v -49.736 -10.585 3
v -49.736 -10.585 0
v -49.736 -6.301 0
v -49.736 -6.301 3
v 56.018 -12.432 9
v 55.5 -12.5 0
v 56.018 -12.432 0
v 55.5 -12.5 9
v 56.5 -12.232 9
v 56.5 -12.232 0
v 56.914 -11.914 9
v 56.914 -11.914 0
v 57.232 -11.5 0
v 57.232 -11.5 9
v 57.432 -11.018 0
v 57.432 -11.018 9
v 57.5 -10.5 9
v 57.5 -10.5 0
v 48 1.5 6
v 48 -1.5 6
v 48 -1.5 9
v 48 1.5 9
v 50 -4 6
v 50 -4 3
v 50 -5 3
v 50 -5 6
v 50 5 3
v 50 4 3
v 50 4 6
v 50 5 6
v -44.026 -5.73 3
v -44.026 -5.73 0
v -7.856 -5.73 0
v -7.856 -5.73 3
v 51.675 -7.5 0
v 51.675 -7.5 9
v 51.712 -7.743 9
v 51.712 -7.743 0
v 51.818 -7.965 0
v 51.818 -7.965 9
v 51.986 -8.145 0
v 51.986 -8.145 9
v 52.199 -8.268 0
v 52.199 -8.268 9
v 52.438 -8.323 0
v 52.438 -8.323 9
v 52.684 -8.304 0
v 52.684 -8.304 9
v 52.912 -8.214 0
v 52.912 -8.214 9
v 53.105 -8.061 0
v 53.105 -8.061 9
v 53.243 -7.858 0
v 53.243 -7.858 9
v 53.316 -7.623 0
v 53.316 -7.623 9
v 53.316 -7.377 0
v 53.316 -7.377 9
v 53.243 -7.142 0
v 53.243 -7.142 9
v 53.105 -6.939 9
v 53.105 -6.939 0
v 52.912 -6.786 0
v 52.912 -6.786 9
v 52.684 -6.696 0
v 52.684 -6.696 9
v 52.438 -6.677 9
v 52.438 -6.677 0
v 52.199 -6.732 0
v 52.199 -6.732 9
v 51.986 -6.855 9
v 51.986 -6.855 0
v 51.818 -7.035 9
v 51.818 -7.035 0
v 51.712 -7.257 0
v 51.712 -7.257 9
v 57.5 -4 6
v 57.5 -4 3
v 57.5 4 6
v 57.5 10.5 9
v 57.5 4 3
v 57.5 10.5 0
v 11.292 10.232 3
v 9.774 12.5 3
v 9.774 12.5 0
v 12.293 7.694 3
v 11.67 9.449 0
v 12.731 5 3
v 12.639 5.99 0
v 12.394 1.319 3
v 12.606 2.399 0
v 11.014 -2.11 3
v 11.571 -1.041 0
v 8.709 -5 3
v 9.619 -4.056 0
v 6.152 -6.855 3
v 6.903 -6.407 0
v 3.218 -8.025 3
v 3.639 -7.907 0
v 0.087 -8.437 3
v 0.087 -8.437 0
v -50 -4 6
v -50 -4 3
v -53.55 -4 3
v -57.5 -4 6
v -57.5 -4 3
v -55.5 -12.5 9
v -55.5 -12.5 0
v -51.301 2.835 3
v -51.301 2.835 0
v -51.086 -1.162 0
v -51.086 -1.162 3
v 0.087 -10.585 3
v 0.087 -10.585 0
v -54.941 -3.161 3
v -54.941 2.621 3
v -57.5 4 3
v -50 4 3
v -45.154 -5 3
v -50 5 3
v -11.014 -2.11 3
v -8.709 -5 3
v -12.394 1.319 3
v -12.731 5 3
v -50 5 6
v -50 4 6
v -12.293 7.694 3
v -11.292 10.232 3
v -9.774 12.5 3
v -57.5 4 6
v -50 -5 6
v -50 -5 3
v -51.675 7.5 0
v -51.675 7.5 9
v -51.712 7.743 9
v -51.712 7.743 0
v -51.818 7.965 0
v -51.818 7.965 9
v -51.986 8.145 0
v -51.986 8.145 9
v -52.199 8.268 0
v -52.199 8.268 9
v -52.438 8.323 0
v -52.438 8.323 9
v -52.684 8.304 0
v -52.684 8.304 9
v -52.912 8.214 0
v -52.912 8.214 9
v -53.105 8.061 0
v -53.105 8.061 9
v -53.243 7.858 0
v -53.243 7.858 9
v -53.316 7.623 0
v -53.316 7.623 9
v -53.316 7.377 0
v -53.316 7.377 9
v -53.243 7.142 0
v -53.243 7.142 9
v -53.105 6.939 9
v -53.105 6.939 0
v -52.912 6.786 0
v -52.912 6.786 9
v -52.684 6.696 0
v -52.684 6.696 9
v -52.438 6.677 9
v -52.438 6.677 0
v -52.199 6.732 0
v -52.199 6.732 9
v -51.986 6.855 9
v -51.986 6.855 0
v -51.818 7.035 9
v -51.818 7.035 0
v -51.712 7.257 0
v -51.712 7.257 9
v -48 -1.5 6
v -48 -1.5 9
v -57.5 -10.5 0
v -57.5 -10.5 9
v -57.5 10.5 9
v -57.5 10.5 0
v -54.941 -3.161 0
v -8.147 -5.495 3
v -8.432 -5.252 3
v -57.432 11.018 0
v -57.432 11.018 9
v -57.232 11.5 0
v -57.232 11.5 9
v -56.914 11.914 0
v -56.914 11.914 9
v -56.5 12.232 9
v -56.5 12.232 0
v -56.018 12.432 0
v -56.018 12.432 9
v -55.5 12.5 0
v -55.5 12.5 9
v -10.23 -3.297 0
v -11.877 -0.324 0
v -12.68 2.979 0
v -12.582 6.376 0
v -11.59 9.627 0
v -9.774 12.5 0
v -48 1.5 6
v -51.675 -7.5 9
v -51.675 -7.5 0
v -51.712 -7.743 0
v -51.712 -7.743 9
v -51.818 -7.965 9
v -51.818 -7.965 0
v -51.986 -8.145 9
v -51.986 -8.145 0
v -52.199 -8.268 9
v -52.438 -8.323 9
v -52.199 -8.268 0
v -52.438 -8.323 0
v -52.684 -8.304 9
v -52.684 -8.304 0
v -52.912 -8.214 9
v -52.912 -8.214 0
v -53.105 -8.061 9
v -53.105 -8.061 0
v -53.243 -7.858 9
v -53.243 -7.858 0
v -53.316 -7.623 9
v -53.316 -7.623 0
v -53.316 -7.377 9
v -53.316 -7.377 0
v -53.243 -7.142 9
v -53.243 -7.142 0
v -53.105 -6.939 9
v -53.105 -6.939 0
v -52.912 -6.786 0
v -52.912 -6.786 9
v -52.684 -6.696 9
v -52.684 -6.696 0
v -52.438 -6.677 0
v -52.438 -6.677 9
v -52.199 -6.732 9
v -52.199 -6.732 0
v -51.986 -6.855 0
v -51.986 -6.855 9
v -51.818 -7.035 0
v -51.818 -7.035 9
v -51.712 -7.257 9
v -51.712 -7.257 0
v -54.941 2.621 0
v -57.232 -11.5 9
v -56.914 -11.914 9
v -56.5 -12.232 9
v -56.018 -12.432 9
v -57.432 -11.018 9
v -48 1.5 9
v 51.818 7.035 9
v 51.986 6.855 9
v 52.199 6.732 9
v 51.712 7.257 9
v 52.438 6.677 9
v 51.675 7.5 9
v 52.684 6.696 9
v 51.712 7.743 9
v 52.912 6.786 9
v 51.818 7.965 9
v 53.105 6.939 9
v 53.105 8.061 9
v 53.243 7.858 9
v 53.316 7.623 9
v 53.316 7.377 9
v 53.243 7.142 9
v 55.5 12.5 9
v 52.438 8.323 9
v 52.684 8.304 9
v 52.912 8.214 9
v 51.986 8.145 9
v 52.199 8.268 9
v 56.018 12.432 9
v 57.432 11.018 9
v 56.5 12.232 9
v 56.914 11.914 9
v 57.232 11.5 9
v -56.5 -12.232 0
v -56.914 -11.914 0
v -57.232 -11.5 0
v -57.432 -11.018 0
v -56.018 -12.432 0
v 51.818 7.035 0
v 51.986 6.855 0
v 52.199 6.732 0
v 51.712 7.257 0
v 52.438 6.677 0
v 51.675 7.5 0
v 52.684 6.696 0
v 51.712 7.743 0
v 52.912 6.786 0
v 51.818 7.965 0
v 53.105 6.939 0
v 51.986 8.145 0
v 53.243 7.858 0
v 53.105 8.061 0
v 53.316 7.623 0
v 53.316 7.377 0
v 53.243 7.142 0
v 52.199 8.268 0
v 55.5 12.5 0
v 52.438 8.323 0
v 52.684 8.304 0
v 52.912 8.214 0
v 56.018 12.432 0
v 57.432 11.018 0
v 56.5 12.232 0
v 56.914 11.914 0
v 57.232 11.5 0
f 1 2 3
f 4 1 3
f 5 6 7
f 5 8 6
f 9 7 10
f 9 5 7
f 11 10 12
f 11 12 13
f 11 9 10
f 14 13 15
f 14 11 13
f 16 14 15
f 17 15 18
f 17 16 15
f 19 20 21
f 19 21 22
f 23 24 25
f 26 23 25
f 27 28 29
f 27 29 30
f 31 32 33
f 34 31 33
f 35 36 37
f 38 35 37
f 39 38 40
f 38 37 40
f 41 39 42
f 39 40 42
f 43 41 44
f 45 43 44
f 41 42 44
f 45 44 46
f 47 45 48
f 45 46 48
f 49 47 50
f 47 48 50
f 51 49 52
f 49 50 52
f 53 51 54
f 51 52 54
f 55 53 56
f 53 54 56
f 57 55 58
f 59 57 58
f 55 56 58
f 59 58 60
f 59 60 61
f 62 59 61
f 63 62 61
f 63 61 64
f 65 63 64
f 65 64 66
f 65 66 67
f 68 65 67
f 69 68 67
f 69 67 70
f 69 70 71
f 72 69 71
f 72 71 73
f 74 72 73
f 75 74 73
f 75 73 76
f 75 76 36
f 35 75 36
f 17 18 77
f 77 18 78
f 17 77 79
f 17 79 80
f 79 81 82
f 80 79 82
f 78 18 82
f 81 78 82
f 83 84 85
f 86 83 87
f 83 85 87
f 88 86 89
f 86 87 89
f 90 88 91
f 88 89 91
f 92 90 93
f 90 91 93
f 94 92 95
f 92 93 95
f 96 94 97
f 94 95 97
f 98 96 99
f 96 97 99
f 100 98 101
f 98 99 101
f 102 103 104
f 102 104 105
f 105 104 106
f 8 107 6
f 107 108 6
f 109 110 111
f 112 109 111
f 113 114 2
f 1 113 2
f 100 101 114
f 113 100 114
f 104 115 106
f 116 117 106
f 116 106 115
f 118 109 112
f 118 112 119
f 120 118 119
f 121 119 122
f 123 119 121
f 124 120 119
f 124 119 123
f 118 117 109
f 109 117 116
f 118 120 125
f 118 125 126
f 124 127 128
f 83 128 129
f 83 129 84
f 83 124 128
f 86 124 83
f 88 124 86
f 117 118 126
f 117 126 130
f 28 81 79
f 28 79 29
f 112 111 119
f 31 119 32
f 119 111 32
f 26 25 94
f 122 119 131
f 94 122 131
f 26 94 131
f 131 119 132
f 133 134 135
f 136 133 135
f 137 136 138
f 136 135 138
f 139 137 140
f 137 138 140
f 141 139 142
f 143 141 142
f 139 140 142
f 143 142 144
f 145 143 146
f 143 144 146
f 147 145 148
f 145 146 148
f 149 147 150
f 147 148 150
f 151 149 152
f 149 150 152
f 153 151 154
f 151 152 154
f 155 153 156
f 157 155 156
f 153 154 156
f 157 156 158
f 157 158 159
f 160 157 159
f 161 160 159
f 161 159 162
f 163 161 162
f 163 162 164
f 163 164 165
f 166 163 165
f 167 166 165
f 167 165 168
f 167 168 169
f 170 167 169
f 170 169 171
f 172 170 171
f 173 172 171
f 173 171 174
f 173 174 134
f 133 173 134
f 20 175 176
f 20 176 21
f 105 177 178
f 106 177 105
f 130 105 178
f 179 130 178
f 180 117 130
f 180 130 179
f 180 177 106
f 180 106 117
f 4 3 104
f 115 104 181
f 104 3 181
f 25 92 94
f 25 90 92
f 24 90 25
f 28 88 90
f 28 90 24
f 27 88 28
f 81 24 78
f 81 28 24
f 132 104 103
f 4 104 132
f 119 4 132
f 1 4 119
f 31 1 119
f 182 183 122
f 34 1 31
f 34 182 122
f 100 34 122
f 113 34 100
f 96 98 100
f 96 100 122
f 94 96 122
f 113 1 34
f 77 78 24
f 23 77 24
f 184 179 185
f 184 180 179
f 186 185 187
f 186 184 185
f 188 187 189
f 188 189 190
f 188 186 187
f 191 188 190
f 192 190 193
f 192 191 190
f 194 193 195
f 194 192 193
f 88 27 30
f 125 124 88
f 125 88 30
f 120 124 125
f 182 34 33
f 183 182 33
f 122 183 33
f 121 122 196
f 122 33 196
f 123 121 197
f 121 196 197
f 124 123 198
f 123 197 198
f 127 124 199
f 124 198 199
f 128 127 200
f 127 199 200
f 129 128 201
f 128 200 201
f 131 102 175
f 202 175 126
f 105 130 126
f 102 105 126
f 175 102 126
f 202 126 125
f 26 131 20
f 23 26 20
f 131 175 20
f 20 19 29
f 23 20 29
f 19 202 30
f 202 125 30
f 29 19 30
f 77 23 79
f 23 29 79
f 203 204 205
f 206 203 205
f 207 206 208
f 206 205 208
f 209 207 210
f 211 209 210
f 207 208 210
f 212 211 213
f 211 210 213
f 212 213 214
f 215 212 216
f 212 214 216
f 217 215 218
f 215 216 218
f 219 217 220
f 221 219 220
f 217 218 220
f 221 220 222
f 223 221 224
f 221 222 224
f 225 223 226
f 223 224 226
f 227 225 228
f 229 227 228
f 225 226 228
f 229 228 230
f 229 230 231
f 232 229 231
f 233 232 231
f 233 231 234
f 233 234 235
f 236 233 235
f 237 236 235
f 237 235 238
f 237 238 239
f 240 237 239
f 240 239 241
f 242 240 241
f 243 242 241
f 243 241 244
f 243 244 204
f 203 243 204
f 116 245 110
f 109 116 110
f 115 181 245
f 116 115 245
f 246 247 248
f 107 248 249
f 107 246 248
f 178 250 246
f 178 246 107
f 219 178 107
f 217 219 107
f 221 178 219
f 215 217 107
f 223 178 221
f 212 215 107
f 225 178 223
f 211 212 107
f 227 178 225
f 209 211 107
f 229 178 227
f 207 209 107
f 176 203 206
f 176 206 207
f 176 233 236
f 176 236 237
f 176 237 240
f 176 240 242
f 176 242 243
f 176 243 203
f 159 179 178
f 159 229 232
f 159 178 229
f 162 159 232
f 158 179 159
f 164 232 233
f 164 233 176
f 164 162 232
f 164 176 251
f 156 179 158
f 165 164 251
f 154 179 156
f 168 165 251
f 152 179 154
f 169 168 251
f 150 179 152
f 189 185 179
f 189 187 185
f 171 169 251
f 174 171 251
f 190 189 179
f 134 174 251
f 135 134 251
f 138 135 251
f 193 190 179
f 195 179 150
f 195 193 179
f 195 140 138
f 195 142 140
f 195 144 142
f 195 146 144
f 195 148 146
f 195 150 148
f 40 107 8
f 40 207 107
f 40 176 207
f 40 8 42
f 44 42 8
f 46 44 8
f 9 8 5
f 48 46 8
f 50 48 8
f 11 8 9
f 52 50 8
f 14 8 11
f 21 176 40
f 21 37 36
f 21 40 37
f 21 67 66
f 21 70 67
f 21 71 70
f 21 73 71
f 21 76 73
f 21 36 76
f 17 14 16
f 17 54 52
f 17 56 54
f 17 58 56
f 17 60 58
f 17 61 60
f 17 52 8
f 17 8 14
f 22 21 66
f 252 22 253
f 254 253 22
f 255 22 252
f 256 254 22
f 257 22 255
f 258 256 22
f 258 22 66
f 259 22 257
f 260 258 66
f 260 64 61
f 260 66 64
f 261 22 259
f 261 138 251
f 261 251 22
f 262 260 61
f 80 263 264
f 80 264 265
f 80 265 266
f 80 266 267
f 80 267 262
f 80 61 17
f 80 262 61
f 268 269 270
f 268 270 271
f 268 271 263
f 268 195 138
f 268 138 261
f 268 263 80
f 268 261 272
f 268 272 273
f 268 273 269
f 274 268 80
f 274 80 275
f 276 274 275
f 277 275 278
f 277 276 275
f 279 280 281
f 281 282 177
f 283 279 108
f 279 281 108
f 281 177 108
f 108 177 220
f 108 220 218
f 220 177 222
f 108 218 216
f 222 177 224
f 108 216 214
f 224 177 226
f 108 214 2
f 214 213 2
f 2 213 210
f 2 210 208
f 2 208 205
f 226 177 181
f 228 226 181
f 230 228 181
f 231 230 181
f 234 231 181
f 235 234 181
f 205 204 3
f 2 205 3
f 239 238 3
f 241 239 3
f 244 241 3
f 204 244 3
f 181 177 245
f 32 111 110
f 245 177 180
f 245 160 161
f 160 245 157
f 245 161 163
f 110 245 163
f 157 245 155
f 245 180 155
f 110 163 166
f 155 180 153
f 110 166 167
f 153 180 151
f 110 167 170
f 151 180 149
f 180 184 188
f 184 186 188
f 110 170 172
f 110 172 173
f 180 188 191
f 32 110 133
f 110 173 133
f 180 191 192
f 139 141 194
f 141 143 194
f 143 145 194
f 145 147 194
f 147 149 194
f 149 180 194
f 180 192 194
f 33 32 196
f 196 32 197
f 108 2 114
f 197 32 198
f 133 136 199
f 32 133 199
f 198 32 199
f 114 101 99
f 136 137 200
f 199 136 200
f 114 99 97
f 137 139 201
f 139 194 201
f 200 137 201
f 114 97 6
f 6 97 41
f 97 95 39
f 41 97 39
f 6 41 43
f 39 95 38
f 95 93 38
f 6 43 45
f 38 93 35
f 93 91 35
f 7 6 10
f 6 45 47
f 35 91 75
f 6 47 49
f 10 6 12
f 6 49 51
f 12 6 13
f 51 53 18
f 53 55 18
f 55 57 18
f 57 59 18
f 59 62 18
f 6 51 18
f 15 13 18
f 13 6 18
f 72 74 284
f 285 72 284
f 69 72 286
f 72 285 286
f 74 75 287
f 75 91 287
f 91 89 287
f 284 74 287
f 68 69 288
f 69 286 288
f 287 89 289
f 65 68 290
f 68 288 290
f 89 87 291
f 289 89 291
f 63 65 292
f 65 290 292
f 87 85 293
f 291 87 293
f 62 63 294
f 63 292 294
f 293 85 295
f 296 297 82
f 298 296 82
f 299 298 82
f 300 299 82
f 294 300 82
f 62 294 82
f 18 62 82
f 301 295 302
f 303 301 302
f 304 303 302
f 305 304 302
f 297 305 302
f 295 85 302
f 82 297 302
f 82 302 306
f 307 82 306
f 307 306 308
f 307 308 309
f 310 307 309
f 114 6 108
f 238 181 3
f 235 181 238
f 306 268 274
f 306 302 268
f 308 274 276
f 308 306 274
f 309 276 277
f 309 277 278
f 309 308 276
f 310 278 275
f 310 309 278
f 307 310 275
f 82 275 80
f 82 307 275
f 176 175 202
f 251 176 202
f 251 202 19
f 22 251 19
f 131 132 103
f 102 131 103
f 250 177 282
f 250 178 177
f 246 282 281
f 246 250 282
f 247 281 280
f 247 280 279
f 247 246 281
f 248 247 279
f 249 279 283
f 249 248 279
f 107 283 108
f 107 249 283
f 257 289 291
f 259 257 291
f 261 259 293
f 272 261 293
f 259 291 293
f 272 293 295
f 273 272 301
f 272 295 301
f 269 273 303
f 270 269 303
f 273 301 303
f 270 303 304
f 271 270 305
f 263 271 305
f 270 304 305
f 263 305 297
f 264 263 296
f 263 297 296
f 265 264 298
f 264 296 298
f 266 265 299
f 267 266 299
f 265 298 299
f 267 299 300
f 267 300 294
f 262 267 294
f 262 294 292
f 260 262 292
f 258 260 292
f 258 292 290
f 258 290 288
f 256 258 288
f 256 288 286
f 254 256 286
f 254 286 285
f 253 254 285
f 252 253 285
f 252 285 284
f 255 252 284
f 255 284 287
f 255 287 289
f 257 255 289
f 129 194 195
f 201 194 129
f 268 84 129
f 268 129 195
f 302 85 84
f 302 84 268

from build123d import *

# Parameters (mm, degrees)
SKETCH_W              = 115
SKETCH_H              = 25
PAD_DEPTH             = 3
PAD001_DEPTH          = 3
SKETCH002_W           = 115
SKETCH002_H           = 25
SKETCH002_W_2         = 96
SKETCH002_H_2         = 3
PAD002_DEPTH          = 3
SKETCH003_R           = 0.825
POCKET_DEPTH          = 245.060315
POLARPATTERN_COUNT    = 2
POLARPATTERN001_COUNT = 2
POLARPATTERN002_COUNT = 2
FILLET_R              = 2
SKETCH004_R           = 12.75
POCKET001_DEPTH       = 3
POCKET002_DEPTH       = 3


with BuildPart() as part:
    # Sketch → Pad (new body)
    with BuildSketch(Plane.XY):
        Rectangle(SKETCH_W, SKETCH_H)
    extrude(amount=PAD_DEPTH)

    # Sketch001 (on Face6 of Pad) → Pad001 (join)
    with BuildSketch(Plane.XY.offset(3)):
        Polygon((-57.5, 12.5), (57.5, 12.5), (57.5, 4), (50, 4), (50, 5), (-50, 5), (-50, 4), (-57.5, 4), align=None)
        Polygon((-57.5, -12.5), (57.5, -12.5), (57.5, -4), (50, -4), (50, -5), (-50, -5), (-50, -4), (-57.5, -4), align=None)
    extrude(amount=PAD001_DEPTH)

    # Sketch002 (on Face12 of Pad001) → Pad002 (join)
    with BuildSketch(Plane.XY.offset(6)):
        Rectangle(SKETCH002_W, SKETCH002_H)
        Rectangle(SKETCH002_W_2, SKETCH002_H_2, mode=Mode.SUBTRACT)
    extrude(amount=PAD002_DEPTH)

    # Sketch003 (on Face26 of Pad002) → Pocket (cut, through all)
    with BuildSketch(Plane.XY.offset(9)):
        with Locations((-52.5, 7.5)):
            Circle(SKETCH003_R)
    pocket = extrude(amount=-POCKET_DEPTH, mode=Mode.SUBTRACT)

    # PolarPattern: Pocket ×2 about axis
    polarpattern_axis = Axis((0, 0, 0), (0, 1, 0))
    for i in range(1, POLARPATTERN_COUNT):
        add(pocket.rotate(polarpattern_axis, i * 360 / POLARPATTERN_COUNT), mode=Mode.SUBTRACT)

    # PolarPattern001: Pocket ×2 about axis
    polarpattern001_axis = Axis((0, 0, 0), (1, 0, 0))
    for i in range(1, POLARPATTERN001_COUNT):
        add(pocket.rotate(polarpattern001_axis, i * 360 / POLARPATTERN001_COUNT), mode=Mode.SUBTRACT)

    # PolarPattern002: Pocket ×2 about axis
    polarpattern002_axis = Axis((0, 0, 9), (0, 0, 1))
    for i in range(1, POLARPATTERN002_COUNT):
        add(pocket.rotate(polarpattern002_axis, i * 360 / POLARPATTERN002_COUNT), mode=Mode.SUBTRACT)

    # Fillet
    fillet_edges = [part.edges().sort_by_distance(p)[0] for p in [
        (57.5, 12.5, 7.5),
        (57.5, 12.5, 4.5),
        (57.5, 12.5, 1.5),
        (57.5, -12.5, 7.5),
        (-57.5, 12.5, 7.5),
        (-57.5, -12.5, 7.5),
    ]]
    fillet(fillet_edges, radius=FILLET_R)

    # Sketch004 (on Face2 of Fillet) → Pocket001 (cut)
    with BuildSketch(Plane(origin=(0, 0, 0), x_dir=(1, 0, 0), z_dir=(0, 0, -1))):
        with Locations((0, -4.31247)):
            Circle(SKETCH004_R)
    extrude(amount=-POCKET001_DEPTH, mode=Mode.SUBTRACT)

    # Sketch005 (on Face2 of Pocket001) → Pocket002 (cut)
    with BuildSketch(Plane(origin=(0, 0, 0), x_dir=(1, 0, 0), z_dir=(0, 0, -1))):
        Polygon((0.086598, 10.584693), (-49.736099, 10.584693), (-49.736099, 6.30074), (-54.94091, 3.161258), (-54.94091, -2.621142), (-51.300568, -2.835279), (-51.086433, 1.161956), (-44.025761, 5.729707), (0.086598, 5.729707), align=None)
    extrude(amount=-POCKET002_DEPTH, mode=Mode.SUBTRACT)


solid = part.part
